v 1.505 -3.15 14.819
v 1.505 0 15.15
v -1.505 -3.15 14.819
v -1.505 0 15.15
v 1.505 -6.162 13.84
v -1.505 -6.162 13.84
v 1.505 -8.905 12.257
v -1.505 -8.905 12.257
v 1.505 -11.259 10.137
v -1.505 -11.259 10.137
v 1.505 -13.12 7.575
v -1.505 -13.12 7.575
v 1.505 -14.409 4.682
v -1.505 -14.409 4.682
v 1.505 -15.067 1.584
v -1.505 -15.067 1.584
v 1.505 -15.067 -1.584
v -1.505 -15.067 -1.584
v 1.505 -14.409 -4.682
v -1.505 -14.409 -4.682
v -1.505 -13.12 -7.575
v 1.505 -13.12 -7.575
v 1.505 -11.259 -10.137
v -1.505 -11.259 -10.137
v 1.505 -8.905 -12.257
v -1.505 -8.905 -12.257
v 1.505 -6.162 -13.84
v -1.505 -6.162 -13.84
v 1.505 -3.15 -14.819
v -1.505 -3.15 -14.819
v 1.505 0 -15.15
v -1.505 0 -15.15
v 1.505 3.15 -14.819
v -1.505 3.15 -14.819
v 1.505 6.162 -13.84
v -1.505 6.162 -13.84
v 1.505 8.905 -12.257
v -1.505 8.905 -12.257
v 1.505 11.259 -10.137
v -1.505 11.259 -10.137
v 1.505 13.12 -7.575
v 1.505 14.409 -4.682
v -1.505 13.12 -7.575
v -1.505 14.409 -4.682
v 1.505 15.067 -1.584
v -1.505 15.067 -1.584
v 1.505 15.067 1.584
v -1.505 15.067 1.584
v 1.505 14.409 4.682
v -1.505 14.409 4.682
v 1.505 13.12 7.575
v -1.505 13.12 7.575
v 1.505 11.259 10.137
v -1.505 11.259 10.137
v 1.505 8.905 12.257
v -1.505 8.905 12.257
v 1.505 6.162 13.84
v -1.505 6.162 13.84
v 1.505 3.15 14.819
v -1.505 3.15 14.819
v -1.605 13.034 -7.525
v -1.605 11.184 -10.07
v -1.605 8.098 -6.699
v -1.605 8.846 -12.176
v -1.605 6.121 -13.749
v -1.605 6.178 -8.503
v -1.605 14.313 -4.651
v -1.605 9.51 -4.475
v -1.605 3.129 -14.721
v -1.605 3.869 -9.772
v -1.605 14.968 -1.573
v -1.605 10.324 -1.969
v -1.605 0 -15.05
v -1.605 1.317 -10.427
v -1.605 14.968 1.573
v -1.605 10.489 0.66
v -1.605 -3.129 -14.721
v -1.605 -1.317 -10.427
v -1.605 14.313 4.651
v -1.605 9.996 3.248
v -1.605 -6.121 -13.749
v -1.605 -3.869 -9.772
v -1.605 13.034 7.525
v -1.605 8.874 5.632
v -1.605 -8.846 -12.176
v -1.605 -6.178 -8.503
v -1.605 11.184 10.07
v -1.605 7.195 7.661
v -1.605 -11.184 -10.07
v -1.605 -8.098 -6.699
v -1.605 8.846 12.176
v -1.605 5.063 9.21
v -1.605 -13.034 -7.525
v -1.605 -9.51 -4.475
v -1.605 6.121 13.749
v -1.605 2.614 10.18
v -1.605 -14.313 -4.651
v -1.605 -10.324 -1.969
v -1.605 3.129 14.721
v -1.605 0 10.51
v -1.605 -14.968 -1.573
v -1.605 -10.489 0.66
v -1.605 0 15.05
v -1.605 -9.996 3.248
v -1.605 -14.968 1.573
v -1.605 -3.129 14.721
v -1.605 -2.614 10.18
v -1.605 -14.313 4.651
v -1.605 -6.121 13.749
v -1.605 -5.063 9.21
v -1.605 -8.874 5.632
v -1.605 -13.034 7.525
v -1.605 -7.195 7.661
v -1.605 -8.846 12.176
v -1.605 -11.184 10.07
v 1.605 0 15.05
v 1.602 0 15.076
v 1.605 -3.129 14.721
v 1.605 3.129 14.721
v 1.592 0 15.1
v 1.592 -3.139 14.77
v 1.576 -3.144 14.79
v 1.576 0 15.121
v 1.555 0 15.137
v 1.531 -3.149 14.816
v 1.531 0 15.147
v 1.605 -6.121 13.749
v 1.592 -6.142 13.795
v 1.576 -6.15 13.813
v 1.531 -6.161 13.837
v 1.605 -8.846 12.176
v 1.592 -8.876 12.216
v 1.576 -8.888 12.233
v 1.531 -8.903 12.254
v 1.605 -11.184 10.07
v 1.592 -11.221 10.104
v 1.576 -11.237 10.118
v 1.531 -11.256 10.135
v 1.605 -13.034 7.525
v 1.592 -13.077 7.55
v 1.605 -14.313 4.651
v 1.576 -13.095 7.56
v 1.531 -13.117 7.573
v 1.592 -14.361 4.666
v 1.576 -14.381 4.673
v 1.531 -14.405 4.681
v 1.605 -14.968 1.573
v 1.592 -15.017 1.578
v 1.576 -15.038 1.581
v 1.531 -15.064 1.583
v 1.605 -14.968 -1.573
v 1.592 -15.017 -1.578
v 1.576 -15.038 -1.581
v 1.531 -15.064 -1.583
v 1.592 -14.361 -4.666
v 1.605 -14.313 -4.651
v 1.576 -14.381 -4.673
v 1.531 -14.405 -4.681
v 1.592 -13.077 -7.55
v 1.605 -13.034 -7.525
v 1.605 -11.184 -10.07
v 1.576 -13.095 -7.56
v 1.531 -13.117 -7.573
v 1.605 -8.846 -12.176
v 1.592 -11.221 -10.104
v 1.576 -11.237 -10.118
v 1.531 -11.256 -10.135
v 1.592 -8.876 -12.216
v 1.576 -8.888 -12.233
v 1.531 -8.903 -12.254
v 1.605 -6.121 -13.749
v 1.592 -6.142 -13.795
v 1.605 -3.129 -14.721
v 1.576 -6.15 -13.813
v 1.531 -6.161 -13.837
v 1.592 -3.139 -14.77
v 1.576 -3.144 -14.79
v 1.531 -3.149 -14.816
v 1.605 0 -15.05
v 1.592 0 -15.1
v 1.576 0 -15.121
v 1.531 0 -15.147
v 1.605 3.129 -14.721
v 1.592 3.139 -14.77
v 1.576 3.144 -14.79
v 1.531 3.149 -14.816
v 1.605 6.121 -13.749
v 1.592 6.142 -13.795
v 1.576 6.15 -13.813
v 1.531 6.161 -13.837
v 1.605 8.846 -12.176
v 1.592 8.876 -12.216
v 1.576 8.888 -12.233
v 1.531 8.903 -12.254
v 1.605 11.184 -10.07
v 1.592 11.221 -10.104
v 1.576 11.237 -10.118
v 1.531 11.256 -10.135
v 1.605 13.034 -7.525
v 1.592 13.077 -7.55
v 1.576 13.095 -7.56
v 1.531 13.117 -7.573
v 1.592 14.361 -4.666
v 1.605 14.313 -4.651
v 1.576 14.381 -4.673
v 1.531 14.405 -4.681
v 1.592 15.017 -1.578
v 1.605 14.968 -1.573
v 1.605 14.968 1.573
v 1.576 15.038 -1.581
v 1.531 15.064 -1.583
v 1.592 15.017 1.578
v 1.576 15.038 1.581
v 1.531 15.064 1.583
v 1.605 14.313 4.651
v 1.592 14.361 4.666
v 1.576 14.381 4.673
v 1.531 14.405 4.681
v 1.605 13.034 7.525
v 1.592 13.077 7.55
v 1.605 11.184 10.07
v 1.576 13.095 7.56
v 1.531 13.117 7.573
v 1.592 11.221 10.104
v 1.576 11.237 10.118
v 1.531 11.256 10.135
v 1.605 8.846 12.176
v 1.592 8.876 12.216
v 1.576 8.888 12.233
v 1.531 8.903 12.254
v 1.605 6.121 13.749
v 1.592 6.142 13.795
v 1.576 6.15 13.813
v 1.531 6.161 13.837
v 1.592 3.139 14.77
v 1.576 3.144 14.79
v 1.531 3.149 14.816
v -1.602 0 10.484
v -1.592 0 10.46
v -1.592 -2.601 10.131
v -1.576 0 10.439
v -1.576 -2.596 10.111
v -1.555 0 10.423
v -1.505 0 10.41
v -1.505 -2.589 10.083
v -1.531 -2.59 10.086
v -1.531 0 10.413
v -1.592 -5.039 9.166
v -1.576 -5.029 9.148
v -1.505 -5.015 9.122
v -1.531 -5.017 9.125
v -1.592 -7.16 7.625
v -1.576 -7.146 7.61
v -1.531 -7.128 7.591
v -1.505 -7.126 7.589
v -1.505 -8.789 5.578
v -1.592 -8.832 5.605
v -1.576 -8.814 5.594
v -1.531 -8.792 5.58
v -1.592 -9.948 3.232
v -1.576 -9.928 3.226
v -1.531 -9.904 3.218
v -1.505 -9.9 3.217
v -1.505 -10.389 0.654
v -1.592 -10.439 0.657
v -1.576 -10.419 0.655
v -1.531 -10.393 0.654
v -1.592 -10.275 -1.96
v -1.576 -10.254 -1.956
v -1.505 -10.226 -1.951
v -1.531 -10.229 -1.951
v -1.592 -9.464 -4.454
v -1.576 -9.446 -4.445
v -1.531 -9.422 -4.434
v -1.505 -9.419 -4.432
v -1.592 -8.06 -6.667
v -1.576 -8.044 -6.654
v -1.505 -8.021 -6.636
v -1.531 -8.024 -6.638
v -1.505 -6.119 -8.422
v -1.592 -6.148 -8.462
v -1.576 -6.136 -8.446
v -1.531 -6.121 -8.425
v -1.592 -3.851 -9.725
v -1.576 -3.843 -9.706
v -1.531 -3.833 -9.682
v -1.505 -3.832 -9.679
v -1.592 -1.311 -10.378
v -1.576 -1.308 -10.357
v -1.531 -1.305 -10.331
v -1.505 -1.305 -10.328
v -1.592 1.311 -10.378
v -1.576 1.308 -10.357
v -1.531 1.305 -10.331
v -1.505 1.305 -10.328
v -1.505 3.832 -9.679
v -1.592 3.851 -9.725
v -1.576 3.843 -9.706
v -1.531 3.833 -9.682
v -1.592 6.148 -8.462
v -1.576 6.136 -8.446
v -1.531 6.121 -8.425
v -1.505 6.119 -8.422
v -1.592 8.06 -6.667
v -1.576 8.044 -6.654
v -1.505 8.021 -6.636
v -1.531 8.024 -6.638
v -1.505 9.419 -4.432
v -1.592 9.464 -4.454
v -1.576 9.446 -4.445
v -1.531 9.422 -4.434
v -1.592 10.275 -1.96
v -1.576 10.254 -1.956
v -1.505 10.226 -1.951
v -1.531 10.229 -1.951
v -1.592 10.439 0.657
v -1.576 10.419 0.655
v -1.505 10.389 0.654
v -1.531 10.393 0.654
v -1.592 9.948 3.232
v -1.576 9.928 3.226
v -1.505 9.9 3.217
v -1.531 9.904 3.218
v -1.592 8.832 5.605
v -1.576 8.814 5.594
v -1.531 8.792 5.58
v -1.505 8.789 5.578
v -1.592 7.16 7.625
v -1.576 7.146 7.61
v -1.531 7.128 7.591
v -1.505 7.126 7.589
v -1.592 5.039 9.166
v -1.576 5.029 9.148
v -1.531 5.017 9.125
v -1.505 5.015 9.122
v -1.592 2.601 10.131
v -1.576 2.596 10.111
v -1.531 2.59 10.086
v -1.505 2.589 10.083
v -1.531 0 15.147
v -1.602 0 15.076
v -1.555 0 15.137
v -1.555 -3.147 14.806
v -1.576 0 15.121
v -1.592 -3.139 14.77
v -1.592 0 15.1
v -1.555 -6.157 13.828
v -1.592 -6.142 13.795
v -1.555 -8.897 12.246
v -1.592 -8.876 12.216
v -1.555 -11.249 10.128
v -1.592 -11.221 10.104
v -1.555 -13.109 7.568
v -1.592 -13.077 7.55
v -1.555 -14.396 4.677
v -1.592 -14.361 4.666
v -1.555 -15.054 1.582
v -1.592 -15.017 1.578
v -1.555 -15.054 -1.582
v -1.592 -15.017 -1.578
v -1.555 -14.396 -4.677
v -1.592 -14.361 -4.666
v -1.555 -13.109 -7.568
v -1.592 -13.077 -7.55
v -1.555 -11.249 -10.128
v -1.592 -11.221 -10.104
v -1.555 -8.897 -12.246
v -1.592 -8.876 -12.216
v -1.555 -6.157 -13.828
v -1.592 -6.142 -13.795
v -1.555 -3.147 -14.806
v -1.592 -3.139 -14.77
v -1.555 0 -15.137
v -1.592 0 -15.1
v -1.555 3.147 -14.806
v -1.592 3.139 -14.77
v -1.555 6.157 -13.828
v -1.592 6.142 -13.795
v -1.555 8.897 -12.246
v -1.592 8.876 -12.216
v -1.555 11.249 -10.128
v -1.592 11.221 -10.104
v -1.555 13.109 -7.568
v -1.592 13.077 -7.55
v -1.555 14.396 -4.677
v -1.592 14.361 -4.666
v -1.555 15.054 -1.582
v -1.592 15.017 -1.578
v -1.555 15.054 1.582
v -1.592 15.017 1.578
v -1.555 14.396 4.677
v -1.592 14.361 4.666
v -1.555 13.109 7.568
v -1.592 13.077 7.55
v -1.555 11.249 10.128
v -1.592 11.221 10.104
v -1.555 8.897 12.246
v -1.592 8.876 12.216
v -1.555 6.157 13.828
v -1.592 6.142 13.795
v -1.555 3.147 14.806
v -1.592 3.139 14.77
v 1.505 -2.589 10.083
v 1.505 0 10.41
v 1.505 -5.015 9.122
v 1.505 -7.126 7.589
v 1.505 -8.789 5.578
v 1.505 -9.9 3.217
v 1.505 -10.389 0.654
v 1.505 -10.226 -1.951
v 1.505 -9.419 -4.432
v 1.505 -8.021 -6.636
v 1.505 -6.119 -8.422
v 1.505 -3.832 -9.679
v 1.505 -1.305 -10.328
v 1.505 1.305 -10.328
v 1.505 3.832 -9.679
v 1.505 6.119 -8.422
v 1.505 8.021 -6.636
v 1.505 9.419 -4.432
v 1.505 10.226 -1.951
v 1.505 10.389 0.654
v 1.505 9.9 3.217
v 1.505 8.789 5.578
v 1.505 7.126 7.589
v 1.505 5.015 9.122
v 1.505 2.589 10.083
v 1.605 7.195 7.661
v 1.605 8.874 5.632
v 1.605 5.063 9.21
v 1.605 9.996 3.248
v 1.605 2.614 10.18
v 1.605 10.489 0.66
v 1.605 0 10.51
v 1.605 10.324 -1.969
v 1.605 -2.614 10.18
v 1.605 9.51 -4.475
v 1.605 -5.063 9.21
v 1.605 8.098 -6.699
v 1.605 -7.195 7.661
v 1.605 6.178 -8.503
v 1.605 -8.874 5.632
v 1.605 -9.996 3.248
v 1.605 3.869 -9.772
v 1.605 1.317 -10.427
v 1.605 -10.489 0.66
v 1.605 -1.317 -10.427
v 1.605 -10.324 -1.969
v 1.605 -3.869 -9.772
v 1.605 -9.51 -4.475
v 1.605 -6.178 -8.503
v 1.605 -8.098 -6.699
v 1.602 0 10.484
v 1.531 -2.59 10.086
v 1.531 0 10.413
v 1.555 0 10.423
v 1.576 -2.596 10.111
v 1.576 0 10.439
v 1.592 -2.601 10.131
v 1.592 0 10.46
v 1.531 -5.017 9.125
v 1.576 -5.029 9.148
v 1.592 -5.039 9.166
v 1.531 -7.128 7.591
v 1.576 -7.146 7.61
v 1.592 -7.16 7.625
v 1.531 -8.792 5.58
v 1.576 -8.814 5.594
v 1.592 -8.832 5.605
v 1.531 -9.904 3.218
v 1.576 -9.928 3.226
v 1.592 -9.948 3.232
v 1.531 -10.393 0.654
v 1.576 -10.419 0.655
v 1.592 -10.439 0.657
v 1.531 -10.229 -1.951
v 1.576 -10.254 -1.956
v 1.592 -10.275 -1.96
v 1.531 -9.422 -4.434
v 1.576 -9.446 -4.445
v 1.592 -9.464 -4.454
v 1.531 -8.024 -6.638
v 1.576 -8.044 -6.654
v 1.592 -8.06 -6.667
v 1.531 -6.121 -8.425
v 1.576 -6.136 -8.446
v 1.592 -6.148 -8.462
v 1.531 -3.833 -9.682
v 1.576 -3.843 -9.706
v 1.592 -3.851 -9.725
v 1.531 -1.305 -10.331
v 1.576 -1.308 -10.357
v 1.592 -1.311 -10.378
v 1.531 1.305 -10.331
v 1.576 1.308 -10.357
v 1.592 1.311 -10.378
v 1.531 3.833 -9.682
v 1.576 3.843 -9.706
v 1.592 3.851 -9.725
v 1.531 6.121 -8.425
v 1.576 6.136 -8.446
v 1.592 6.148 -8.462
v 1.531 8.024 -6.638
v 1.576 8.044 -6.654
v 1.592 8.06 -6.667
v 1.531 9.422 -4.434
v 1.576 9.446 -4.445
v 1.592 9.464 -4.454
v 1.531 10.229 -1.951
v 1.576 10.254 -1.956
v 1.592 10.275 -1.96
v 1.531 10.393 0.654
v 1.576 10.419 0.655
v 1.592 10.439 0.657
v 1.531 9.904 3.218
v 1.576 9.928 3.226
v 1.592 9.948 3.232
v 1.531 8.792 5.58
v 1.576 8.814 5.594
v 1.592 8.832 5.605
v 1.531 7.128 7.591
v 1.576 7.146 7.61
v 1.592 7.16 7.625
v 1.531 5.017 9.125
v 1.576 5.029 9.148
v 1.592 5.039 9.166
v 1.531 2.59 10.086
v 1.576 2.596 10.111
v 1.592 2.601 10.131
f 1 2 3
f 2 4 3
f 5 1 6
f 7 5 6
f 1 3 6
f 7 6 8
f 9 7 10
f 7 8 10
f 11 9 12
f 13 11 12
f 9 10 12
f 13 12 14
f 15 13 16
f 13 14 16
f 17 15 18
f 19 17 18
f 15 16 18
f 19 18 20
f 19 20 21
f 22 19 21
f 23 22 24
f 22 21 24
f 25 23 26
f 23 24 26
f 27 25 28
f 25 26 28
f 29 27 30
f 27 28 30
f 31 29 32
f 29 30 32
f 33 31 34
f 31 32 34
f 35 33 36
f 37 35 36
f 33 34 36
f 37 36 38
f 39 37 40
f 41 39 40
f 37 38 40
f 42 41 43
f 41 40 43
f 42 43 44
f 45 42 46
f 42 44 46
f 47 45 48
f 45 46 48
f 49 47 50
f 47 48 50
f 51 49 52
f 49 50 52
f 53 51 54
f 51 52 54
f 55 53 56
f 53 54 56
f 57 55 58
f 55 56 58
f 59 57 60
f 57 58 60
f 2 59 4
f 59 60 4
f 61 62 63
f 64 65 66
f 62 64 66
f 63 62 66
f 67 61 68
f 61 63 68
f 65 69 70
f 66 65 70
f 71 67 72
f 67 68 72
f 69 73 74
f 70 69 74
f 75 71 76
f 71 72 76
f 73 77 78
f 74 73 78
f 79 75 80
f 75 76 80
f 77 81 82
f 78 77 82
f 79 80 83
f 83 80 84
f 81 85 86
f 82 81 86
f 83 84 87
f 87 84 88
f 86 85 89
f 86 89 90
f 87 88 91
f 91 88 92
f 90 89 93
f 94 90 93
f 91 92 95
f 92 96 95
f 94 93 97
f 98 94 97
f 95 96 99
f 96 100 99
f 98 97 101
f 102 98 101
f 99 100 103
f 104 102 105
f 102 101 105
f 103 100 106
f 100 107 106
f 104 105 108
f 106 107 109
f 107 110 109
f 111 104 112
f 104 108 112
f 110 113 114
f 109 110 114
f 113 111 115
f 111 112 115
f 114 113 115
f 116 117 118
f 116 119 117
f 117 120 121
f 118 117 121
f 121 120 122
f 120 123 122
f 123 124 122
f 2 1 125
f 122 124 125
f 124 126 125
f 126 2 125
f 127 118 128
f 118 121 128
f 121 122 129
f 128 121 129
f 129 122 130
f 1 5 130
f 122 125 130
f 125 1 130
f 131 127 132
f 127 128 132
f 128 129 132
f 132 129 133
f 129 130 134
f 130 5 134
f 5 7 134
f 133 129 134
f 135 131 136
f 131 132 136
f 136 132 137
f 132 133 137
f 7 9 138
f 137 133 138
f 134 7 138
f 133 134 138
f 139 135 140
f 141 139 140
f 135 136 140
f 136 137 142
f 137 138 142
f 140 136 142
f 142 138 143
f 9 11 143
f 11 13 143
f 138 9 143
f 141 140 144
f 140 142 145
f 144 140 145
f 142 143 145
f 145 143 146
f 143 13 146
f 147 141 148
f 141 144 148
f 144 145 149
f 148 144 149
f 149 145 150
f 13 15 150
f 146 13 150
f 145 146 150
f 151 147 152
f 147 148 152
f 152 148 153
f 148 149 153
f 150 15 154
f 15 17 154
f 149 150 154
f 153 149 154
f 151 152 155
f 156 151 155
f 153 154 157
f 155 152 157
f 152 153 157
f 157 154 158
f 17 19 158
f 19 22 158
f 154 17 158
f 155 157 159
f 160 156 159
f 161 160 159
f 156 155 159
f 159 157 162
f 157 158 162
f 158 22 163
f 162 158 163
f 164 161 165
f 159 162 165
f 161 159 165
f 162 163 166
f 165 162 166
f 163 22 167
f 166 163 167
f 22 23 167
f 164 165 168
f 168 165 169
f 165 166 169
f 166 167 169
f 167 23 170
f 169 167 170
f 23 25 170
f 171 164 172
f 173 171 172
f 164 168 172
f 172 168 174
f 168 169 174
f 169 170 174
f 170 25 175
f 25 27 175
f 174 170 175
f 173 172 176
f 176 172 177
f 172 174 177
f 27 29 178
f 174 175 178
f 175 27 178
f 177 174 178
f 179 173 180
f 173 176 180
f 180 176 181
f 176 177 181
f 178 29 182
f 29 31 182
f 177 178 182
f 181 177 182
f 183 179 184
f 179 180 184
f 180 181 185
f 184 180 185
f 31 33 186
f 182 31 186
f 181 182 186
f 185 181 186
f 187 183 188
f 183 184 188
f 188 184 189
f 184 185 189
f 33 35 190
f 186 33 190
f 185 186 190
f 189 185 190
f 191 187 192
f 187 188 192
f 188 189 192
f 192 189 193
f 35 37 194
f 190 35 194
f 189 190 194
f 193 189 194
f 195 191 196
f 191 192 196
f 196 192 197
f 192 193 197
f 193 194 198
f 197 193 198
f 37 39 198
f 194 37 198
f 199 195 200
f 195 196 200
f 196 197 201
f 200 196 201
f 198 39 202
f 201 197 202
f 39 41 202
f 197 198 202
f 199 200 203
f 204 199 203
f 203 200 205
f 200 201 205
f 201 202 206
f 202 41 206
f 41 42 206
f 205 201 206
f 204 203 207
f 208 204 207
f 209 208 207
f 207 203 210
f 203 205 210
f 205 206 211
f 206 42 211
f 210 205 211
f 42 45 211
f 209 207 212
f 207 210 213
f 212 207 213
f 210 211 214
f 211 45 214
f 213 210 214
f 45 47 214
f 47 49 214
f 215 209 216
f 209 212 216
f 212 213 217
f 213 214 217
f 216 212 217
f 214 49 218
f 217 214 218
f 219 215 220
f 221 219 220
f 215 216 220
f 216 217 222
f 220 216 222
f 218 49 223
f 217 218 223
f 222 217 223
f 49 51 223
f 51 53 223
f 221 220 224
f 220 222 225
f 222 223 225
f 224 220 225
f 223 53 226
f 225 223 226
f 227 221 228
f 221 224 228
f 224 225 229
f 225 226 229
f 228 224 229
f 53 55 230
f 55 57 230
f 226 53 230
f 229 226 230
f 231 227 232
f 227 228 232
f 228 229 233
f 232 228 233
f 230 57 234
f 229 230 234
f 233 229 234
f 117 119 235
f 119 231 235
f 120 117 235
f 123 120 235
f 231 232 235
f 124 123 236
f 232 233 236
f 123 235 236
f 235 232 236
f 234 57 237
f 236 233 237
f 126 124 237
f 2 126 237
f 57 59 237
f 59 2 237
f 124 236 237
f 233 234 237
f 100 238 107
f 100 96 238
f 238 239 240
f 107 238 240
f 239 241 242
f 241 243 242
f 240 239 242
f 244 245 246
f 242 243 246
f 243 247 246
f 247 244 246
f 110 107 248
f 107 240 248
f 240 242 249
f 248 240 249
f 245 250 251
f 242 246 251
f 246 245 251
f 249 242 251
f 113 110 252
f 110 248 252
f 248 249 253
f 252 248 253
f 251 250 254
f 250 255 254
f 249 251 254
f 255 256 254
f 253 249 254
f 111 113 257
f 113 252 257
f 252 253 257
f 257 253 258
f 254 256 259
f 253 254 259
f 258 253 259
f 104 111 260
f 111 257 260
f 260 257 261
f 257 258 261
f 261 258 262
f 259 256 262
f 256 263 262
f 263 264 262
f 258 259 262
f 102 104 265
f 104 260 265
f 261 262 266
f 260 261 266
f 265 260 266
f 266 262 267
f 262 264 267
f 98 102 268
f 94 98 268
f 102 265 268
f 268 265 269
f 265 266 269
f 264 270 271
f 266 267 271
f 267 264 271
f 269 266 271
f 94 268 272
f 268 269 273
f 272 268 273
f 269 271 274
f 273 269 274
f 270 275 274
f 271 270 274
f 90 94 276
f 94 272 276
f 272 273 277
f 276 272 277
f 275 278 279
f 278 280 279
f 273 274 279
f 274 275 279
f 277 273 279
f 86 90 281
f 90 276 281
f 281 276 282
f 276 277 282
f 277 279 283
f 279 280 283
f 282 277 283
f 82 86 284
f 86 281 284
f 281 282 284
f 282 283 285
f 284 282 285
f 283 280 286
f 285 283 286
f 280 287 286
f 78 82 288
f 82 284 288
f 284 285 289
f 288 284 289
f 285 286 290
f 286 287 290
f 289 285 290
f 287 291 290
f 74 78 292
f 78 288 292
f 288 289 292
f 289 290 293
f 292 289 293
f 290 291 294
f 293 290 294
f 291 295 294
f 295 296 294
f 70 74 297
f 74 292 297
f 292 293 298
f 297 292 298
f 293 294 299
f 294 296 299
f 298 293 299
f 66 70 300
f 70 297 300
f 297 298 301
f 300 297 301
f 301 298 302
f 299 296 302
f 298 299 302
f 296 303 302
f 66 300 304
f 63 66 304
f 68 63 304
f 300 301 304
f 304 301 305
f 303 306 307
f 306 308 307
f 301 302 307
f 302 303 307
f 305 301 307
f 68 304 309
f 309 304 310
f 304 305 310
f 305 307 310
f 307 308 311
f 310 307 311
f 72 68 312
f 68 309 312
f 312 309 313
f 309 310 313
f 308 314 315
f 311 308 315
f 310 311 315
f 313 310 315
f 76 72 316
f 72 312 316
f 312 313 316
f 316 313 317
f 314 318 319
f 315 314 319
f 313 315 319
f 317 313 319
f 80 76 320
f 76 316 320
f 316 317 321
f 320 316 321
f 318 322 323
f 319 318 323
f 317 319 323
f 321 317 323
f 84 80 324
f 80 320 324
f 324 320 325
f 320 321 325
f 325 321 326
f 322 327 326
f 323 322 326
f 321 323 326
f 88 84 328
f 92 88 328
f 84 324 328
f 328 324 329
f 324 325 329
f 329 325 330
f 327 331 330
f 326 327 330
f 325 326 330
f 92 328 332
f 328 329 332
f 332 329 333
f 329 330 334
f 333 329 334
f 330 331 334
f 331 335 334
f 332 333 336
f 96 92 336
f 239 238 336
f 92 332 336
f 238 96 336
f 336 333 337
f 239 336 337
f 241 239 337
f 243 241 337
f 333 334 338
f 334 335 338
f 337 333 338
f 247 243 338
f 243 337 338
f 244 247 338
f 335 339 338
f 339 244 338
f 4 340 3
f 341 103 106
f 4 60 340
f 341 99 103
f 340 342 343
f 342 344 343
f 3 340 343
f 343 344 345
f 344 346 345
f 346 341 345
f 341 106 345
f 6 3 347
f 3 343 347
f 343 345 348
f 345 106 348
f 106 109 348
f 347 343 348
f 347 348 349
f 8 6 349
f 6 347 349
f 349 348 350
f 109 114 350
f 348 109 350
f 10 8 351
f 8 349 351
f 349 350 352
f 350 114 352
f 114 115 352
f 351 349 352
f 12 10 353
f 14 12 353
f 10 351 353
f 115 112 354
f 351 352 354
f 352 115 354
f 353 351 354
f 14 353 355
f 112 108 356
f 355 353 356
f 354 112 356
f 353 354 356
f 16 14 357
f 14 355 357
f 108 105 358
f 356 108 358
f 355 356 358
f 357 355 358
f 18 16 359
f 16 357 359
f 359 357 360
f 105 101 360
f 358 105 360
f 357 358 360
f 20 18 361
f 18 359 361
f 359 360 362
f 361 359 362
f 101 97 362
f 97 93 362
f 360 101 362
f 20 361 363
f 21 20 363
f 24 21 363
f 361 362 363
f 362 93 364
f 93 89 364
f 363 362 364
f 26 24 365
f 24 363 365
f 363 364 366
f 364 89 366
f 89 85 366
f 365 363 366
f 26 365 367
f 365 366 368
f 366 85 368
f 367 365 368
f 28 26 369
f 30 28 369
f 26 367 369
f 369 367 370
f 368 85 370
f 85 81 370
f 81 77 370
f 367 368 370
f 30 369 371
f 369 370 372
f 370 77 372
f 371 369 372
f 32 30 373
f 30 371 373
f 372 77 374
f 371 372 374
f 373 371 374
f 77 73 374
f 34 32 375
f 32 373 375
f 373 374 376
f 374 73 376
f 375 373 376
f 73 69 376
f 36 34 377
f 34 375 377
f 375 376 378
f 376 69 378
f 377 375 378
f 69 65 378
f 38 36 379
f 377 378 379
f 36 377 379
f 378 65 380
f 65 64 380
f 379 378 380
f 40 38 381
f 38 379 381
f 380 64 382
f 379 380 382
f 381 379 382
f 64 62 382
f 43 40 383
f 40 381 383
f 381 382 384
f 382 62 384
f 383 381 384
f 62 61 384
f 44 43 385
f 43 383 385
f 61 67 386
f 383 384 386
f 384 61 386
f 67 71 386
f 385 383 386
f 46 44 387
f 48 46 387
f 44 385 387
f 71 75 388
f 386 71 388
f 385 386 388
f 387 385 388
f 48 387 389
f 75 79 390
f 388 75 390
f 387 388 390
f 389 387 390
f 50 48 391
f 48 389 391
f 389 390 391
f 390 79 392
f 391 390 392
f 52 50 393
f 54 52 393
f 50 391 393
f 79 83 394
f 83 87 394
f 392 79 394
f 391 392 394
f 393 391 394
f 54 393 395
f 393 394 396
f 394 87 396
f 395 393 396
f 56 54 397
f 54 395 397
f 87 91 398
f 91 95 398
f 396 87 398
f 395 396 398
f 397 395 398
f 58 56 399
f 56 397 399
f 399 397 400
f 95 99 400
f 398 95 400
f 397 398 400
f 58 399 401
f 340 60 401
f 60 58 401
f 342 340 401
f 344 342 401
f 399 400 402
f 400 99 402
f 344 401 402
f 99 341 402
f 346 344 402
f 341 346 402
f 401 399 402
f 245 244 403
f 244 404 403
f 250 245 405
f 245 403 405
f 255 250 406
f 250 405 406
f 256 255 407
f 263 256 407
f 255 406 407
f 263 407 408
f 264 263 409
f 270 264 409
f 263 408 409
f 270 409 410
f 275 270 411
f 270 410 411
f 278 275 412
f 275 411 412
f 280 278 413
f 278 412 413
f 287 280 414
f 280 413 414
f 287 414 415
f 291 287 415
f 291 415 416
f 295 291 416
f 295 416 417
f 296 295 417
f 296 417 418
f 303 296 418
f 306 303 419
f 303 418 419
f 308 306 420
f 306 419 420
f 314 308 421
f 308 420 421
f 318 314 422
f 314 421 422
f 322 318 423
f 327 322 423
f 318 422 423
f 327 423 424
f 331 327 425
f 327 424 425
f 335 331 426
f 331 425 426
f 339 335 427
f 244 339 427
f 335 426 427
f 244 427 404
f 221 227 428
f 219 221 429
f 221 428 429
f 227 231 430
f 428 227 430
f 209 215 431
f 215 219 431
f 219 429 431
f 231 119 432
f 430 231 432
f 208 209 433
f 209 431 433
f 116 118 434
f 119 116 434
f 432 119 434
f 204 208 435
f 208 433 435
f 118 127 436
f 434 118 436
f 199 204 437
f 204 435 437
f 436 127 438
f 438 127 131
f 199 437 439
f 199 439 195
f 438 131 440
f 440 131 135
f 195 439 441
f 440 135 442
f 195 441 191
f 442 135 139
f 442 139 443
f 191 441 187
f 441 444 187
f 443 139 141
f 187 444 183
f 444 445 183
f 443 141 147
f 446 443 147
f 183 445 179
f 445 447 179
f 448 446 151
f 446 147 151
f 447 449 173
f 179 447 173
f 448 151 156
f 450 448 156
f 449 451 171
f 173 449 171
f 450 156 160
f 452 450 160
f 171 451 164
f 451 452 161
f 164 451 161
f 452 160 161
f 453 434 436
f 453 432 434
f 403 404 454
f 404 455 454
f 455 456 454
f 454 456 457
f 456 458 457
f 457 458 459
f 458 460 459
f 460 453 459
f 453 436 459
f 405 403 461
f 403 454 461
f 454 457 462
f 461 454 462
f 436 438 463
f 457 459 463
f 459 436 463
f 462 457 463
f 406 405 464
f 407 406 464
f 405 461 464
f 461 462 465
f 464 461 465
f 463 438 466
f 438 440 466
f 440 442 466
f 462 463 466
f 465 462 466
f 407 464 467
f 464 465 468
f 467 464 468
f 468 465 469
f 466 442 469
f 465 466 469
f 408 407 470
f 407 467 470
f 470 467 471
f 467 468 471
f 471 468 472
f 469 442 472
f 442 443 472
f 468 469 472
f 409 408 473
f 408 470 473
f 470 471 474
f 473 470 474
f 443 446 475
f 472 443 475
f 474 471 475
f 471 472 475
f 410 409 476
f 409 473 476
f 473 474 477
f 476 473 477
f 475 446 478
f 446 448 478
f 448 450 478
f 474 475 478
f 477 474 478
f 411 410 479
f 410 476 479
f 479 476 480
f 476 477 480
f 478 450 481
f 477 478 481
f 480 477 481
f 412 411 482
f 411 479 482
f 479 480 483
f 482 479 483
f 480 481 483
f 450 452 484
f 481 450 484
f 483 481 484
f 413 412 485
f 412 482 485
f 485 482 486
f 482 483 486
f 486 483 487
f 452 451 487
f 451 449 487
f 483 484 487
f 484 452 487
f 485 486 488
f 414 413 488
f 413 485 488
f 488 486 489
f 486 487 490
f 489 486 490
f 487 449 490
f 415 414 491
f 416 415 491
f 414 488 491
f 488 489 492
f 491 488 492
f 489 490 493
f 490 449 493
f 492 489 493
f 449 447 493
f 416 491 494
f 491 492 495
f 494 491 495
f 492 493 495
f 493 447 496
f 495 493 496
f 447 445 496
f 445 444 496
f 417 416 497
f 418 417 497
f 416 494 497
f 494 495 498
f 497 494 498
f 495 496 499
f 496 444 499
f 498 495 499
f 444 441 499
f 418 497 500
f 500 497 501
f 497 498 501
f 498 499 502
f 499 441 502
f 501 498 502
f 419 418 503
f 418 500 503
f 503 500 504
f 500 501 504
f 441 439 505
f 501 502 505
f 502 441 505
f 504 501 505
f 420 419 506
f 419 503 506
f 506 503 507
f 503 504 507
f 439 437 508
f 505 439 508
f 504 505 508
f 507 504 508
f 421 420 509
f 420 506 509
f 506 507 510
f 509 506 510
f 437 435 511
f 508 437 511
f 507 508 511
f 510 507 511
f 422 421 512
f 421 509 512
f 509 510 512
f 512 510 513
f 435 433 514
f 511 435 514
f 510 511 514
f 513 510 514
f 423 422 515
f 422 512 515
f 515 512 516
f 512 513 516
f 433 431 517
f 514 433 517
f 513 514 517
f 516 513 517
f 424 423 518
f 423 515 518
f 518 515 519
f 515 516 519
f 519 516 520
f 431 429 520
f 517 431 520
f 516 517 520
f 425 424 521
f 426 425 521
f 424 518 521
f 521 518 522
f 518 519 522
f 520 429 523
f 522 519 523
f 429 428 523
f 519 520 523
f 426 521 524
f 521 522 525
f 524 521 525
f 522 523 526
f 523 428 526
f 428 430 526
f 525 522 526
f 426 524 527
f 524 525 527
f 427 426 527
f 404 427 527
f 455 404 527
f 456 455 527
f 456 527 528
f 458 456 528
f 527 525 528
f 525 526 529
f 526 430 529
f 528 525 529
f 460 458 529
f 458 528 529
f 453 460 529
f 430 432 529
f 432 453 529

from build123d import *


with BuildPart() as part:
    # Croquis1 → Revolución1 (revolve)
    with BuildSketch(Plane(origin=(0, 0, 0), x_dir=(1, 0, 0), z_dir=(0, 1, 0)), mode=Mode.PRIVATE) as revoluci_n1_sk:
        with BuildLine():
            Line((0, 10.41), (1.505, 10.41))
            ThreePointArc((1.505, 10.41), (1.575710678, 10.439289322), (1.605, 10.51))
            Line((1.605, 10.51), (1.605, 15.05))
            ThreePointArc((1.605, 15.05), (1.575710678, 15.120710678), (1.505, 15.15))
            Line((1.505, 15.15), (-1.505, 15.15))
            ThreePointArc((-1.505, 15.15), (-1.575710678, 15.120710678), (-1.605, 15.05))
            Line((-1.605, 15.05), (-1.605, 10.51))
            ThreePointArc((-1.605, 10.51), (-1.575710678, 10.439289322), (-1.505, 10.41))
            Line((-1.505, 10.41), (0, 10.41))
        make_face()
    revolve(revoluci_n1_sk.sketch.rotate(Axis((0, 0, 0), (1, 0, 0)), 180), axis=Axis((0, 0, 0), (1, 0, 0)))


solid = part.part
